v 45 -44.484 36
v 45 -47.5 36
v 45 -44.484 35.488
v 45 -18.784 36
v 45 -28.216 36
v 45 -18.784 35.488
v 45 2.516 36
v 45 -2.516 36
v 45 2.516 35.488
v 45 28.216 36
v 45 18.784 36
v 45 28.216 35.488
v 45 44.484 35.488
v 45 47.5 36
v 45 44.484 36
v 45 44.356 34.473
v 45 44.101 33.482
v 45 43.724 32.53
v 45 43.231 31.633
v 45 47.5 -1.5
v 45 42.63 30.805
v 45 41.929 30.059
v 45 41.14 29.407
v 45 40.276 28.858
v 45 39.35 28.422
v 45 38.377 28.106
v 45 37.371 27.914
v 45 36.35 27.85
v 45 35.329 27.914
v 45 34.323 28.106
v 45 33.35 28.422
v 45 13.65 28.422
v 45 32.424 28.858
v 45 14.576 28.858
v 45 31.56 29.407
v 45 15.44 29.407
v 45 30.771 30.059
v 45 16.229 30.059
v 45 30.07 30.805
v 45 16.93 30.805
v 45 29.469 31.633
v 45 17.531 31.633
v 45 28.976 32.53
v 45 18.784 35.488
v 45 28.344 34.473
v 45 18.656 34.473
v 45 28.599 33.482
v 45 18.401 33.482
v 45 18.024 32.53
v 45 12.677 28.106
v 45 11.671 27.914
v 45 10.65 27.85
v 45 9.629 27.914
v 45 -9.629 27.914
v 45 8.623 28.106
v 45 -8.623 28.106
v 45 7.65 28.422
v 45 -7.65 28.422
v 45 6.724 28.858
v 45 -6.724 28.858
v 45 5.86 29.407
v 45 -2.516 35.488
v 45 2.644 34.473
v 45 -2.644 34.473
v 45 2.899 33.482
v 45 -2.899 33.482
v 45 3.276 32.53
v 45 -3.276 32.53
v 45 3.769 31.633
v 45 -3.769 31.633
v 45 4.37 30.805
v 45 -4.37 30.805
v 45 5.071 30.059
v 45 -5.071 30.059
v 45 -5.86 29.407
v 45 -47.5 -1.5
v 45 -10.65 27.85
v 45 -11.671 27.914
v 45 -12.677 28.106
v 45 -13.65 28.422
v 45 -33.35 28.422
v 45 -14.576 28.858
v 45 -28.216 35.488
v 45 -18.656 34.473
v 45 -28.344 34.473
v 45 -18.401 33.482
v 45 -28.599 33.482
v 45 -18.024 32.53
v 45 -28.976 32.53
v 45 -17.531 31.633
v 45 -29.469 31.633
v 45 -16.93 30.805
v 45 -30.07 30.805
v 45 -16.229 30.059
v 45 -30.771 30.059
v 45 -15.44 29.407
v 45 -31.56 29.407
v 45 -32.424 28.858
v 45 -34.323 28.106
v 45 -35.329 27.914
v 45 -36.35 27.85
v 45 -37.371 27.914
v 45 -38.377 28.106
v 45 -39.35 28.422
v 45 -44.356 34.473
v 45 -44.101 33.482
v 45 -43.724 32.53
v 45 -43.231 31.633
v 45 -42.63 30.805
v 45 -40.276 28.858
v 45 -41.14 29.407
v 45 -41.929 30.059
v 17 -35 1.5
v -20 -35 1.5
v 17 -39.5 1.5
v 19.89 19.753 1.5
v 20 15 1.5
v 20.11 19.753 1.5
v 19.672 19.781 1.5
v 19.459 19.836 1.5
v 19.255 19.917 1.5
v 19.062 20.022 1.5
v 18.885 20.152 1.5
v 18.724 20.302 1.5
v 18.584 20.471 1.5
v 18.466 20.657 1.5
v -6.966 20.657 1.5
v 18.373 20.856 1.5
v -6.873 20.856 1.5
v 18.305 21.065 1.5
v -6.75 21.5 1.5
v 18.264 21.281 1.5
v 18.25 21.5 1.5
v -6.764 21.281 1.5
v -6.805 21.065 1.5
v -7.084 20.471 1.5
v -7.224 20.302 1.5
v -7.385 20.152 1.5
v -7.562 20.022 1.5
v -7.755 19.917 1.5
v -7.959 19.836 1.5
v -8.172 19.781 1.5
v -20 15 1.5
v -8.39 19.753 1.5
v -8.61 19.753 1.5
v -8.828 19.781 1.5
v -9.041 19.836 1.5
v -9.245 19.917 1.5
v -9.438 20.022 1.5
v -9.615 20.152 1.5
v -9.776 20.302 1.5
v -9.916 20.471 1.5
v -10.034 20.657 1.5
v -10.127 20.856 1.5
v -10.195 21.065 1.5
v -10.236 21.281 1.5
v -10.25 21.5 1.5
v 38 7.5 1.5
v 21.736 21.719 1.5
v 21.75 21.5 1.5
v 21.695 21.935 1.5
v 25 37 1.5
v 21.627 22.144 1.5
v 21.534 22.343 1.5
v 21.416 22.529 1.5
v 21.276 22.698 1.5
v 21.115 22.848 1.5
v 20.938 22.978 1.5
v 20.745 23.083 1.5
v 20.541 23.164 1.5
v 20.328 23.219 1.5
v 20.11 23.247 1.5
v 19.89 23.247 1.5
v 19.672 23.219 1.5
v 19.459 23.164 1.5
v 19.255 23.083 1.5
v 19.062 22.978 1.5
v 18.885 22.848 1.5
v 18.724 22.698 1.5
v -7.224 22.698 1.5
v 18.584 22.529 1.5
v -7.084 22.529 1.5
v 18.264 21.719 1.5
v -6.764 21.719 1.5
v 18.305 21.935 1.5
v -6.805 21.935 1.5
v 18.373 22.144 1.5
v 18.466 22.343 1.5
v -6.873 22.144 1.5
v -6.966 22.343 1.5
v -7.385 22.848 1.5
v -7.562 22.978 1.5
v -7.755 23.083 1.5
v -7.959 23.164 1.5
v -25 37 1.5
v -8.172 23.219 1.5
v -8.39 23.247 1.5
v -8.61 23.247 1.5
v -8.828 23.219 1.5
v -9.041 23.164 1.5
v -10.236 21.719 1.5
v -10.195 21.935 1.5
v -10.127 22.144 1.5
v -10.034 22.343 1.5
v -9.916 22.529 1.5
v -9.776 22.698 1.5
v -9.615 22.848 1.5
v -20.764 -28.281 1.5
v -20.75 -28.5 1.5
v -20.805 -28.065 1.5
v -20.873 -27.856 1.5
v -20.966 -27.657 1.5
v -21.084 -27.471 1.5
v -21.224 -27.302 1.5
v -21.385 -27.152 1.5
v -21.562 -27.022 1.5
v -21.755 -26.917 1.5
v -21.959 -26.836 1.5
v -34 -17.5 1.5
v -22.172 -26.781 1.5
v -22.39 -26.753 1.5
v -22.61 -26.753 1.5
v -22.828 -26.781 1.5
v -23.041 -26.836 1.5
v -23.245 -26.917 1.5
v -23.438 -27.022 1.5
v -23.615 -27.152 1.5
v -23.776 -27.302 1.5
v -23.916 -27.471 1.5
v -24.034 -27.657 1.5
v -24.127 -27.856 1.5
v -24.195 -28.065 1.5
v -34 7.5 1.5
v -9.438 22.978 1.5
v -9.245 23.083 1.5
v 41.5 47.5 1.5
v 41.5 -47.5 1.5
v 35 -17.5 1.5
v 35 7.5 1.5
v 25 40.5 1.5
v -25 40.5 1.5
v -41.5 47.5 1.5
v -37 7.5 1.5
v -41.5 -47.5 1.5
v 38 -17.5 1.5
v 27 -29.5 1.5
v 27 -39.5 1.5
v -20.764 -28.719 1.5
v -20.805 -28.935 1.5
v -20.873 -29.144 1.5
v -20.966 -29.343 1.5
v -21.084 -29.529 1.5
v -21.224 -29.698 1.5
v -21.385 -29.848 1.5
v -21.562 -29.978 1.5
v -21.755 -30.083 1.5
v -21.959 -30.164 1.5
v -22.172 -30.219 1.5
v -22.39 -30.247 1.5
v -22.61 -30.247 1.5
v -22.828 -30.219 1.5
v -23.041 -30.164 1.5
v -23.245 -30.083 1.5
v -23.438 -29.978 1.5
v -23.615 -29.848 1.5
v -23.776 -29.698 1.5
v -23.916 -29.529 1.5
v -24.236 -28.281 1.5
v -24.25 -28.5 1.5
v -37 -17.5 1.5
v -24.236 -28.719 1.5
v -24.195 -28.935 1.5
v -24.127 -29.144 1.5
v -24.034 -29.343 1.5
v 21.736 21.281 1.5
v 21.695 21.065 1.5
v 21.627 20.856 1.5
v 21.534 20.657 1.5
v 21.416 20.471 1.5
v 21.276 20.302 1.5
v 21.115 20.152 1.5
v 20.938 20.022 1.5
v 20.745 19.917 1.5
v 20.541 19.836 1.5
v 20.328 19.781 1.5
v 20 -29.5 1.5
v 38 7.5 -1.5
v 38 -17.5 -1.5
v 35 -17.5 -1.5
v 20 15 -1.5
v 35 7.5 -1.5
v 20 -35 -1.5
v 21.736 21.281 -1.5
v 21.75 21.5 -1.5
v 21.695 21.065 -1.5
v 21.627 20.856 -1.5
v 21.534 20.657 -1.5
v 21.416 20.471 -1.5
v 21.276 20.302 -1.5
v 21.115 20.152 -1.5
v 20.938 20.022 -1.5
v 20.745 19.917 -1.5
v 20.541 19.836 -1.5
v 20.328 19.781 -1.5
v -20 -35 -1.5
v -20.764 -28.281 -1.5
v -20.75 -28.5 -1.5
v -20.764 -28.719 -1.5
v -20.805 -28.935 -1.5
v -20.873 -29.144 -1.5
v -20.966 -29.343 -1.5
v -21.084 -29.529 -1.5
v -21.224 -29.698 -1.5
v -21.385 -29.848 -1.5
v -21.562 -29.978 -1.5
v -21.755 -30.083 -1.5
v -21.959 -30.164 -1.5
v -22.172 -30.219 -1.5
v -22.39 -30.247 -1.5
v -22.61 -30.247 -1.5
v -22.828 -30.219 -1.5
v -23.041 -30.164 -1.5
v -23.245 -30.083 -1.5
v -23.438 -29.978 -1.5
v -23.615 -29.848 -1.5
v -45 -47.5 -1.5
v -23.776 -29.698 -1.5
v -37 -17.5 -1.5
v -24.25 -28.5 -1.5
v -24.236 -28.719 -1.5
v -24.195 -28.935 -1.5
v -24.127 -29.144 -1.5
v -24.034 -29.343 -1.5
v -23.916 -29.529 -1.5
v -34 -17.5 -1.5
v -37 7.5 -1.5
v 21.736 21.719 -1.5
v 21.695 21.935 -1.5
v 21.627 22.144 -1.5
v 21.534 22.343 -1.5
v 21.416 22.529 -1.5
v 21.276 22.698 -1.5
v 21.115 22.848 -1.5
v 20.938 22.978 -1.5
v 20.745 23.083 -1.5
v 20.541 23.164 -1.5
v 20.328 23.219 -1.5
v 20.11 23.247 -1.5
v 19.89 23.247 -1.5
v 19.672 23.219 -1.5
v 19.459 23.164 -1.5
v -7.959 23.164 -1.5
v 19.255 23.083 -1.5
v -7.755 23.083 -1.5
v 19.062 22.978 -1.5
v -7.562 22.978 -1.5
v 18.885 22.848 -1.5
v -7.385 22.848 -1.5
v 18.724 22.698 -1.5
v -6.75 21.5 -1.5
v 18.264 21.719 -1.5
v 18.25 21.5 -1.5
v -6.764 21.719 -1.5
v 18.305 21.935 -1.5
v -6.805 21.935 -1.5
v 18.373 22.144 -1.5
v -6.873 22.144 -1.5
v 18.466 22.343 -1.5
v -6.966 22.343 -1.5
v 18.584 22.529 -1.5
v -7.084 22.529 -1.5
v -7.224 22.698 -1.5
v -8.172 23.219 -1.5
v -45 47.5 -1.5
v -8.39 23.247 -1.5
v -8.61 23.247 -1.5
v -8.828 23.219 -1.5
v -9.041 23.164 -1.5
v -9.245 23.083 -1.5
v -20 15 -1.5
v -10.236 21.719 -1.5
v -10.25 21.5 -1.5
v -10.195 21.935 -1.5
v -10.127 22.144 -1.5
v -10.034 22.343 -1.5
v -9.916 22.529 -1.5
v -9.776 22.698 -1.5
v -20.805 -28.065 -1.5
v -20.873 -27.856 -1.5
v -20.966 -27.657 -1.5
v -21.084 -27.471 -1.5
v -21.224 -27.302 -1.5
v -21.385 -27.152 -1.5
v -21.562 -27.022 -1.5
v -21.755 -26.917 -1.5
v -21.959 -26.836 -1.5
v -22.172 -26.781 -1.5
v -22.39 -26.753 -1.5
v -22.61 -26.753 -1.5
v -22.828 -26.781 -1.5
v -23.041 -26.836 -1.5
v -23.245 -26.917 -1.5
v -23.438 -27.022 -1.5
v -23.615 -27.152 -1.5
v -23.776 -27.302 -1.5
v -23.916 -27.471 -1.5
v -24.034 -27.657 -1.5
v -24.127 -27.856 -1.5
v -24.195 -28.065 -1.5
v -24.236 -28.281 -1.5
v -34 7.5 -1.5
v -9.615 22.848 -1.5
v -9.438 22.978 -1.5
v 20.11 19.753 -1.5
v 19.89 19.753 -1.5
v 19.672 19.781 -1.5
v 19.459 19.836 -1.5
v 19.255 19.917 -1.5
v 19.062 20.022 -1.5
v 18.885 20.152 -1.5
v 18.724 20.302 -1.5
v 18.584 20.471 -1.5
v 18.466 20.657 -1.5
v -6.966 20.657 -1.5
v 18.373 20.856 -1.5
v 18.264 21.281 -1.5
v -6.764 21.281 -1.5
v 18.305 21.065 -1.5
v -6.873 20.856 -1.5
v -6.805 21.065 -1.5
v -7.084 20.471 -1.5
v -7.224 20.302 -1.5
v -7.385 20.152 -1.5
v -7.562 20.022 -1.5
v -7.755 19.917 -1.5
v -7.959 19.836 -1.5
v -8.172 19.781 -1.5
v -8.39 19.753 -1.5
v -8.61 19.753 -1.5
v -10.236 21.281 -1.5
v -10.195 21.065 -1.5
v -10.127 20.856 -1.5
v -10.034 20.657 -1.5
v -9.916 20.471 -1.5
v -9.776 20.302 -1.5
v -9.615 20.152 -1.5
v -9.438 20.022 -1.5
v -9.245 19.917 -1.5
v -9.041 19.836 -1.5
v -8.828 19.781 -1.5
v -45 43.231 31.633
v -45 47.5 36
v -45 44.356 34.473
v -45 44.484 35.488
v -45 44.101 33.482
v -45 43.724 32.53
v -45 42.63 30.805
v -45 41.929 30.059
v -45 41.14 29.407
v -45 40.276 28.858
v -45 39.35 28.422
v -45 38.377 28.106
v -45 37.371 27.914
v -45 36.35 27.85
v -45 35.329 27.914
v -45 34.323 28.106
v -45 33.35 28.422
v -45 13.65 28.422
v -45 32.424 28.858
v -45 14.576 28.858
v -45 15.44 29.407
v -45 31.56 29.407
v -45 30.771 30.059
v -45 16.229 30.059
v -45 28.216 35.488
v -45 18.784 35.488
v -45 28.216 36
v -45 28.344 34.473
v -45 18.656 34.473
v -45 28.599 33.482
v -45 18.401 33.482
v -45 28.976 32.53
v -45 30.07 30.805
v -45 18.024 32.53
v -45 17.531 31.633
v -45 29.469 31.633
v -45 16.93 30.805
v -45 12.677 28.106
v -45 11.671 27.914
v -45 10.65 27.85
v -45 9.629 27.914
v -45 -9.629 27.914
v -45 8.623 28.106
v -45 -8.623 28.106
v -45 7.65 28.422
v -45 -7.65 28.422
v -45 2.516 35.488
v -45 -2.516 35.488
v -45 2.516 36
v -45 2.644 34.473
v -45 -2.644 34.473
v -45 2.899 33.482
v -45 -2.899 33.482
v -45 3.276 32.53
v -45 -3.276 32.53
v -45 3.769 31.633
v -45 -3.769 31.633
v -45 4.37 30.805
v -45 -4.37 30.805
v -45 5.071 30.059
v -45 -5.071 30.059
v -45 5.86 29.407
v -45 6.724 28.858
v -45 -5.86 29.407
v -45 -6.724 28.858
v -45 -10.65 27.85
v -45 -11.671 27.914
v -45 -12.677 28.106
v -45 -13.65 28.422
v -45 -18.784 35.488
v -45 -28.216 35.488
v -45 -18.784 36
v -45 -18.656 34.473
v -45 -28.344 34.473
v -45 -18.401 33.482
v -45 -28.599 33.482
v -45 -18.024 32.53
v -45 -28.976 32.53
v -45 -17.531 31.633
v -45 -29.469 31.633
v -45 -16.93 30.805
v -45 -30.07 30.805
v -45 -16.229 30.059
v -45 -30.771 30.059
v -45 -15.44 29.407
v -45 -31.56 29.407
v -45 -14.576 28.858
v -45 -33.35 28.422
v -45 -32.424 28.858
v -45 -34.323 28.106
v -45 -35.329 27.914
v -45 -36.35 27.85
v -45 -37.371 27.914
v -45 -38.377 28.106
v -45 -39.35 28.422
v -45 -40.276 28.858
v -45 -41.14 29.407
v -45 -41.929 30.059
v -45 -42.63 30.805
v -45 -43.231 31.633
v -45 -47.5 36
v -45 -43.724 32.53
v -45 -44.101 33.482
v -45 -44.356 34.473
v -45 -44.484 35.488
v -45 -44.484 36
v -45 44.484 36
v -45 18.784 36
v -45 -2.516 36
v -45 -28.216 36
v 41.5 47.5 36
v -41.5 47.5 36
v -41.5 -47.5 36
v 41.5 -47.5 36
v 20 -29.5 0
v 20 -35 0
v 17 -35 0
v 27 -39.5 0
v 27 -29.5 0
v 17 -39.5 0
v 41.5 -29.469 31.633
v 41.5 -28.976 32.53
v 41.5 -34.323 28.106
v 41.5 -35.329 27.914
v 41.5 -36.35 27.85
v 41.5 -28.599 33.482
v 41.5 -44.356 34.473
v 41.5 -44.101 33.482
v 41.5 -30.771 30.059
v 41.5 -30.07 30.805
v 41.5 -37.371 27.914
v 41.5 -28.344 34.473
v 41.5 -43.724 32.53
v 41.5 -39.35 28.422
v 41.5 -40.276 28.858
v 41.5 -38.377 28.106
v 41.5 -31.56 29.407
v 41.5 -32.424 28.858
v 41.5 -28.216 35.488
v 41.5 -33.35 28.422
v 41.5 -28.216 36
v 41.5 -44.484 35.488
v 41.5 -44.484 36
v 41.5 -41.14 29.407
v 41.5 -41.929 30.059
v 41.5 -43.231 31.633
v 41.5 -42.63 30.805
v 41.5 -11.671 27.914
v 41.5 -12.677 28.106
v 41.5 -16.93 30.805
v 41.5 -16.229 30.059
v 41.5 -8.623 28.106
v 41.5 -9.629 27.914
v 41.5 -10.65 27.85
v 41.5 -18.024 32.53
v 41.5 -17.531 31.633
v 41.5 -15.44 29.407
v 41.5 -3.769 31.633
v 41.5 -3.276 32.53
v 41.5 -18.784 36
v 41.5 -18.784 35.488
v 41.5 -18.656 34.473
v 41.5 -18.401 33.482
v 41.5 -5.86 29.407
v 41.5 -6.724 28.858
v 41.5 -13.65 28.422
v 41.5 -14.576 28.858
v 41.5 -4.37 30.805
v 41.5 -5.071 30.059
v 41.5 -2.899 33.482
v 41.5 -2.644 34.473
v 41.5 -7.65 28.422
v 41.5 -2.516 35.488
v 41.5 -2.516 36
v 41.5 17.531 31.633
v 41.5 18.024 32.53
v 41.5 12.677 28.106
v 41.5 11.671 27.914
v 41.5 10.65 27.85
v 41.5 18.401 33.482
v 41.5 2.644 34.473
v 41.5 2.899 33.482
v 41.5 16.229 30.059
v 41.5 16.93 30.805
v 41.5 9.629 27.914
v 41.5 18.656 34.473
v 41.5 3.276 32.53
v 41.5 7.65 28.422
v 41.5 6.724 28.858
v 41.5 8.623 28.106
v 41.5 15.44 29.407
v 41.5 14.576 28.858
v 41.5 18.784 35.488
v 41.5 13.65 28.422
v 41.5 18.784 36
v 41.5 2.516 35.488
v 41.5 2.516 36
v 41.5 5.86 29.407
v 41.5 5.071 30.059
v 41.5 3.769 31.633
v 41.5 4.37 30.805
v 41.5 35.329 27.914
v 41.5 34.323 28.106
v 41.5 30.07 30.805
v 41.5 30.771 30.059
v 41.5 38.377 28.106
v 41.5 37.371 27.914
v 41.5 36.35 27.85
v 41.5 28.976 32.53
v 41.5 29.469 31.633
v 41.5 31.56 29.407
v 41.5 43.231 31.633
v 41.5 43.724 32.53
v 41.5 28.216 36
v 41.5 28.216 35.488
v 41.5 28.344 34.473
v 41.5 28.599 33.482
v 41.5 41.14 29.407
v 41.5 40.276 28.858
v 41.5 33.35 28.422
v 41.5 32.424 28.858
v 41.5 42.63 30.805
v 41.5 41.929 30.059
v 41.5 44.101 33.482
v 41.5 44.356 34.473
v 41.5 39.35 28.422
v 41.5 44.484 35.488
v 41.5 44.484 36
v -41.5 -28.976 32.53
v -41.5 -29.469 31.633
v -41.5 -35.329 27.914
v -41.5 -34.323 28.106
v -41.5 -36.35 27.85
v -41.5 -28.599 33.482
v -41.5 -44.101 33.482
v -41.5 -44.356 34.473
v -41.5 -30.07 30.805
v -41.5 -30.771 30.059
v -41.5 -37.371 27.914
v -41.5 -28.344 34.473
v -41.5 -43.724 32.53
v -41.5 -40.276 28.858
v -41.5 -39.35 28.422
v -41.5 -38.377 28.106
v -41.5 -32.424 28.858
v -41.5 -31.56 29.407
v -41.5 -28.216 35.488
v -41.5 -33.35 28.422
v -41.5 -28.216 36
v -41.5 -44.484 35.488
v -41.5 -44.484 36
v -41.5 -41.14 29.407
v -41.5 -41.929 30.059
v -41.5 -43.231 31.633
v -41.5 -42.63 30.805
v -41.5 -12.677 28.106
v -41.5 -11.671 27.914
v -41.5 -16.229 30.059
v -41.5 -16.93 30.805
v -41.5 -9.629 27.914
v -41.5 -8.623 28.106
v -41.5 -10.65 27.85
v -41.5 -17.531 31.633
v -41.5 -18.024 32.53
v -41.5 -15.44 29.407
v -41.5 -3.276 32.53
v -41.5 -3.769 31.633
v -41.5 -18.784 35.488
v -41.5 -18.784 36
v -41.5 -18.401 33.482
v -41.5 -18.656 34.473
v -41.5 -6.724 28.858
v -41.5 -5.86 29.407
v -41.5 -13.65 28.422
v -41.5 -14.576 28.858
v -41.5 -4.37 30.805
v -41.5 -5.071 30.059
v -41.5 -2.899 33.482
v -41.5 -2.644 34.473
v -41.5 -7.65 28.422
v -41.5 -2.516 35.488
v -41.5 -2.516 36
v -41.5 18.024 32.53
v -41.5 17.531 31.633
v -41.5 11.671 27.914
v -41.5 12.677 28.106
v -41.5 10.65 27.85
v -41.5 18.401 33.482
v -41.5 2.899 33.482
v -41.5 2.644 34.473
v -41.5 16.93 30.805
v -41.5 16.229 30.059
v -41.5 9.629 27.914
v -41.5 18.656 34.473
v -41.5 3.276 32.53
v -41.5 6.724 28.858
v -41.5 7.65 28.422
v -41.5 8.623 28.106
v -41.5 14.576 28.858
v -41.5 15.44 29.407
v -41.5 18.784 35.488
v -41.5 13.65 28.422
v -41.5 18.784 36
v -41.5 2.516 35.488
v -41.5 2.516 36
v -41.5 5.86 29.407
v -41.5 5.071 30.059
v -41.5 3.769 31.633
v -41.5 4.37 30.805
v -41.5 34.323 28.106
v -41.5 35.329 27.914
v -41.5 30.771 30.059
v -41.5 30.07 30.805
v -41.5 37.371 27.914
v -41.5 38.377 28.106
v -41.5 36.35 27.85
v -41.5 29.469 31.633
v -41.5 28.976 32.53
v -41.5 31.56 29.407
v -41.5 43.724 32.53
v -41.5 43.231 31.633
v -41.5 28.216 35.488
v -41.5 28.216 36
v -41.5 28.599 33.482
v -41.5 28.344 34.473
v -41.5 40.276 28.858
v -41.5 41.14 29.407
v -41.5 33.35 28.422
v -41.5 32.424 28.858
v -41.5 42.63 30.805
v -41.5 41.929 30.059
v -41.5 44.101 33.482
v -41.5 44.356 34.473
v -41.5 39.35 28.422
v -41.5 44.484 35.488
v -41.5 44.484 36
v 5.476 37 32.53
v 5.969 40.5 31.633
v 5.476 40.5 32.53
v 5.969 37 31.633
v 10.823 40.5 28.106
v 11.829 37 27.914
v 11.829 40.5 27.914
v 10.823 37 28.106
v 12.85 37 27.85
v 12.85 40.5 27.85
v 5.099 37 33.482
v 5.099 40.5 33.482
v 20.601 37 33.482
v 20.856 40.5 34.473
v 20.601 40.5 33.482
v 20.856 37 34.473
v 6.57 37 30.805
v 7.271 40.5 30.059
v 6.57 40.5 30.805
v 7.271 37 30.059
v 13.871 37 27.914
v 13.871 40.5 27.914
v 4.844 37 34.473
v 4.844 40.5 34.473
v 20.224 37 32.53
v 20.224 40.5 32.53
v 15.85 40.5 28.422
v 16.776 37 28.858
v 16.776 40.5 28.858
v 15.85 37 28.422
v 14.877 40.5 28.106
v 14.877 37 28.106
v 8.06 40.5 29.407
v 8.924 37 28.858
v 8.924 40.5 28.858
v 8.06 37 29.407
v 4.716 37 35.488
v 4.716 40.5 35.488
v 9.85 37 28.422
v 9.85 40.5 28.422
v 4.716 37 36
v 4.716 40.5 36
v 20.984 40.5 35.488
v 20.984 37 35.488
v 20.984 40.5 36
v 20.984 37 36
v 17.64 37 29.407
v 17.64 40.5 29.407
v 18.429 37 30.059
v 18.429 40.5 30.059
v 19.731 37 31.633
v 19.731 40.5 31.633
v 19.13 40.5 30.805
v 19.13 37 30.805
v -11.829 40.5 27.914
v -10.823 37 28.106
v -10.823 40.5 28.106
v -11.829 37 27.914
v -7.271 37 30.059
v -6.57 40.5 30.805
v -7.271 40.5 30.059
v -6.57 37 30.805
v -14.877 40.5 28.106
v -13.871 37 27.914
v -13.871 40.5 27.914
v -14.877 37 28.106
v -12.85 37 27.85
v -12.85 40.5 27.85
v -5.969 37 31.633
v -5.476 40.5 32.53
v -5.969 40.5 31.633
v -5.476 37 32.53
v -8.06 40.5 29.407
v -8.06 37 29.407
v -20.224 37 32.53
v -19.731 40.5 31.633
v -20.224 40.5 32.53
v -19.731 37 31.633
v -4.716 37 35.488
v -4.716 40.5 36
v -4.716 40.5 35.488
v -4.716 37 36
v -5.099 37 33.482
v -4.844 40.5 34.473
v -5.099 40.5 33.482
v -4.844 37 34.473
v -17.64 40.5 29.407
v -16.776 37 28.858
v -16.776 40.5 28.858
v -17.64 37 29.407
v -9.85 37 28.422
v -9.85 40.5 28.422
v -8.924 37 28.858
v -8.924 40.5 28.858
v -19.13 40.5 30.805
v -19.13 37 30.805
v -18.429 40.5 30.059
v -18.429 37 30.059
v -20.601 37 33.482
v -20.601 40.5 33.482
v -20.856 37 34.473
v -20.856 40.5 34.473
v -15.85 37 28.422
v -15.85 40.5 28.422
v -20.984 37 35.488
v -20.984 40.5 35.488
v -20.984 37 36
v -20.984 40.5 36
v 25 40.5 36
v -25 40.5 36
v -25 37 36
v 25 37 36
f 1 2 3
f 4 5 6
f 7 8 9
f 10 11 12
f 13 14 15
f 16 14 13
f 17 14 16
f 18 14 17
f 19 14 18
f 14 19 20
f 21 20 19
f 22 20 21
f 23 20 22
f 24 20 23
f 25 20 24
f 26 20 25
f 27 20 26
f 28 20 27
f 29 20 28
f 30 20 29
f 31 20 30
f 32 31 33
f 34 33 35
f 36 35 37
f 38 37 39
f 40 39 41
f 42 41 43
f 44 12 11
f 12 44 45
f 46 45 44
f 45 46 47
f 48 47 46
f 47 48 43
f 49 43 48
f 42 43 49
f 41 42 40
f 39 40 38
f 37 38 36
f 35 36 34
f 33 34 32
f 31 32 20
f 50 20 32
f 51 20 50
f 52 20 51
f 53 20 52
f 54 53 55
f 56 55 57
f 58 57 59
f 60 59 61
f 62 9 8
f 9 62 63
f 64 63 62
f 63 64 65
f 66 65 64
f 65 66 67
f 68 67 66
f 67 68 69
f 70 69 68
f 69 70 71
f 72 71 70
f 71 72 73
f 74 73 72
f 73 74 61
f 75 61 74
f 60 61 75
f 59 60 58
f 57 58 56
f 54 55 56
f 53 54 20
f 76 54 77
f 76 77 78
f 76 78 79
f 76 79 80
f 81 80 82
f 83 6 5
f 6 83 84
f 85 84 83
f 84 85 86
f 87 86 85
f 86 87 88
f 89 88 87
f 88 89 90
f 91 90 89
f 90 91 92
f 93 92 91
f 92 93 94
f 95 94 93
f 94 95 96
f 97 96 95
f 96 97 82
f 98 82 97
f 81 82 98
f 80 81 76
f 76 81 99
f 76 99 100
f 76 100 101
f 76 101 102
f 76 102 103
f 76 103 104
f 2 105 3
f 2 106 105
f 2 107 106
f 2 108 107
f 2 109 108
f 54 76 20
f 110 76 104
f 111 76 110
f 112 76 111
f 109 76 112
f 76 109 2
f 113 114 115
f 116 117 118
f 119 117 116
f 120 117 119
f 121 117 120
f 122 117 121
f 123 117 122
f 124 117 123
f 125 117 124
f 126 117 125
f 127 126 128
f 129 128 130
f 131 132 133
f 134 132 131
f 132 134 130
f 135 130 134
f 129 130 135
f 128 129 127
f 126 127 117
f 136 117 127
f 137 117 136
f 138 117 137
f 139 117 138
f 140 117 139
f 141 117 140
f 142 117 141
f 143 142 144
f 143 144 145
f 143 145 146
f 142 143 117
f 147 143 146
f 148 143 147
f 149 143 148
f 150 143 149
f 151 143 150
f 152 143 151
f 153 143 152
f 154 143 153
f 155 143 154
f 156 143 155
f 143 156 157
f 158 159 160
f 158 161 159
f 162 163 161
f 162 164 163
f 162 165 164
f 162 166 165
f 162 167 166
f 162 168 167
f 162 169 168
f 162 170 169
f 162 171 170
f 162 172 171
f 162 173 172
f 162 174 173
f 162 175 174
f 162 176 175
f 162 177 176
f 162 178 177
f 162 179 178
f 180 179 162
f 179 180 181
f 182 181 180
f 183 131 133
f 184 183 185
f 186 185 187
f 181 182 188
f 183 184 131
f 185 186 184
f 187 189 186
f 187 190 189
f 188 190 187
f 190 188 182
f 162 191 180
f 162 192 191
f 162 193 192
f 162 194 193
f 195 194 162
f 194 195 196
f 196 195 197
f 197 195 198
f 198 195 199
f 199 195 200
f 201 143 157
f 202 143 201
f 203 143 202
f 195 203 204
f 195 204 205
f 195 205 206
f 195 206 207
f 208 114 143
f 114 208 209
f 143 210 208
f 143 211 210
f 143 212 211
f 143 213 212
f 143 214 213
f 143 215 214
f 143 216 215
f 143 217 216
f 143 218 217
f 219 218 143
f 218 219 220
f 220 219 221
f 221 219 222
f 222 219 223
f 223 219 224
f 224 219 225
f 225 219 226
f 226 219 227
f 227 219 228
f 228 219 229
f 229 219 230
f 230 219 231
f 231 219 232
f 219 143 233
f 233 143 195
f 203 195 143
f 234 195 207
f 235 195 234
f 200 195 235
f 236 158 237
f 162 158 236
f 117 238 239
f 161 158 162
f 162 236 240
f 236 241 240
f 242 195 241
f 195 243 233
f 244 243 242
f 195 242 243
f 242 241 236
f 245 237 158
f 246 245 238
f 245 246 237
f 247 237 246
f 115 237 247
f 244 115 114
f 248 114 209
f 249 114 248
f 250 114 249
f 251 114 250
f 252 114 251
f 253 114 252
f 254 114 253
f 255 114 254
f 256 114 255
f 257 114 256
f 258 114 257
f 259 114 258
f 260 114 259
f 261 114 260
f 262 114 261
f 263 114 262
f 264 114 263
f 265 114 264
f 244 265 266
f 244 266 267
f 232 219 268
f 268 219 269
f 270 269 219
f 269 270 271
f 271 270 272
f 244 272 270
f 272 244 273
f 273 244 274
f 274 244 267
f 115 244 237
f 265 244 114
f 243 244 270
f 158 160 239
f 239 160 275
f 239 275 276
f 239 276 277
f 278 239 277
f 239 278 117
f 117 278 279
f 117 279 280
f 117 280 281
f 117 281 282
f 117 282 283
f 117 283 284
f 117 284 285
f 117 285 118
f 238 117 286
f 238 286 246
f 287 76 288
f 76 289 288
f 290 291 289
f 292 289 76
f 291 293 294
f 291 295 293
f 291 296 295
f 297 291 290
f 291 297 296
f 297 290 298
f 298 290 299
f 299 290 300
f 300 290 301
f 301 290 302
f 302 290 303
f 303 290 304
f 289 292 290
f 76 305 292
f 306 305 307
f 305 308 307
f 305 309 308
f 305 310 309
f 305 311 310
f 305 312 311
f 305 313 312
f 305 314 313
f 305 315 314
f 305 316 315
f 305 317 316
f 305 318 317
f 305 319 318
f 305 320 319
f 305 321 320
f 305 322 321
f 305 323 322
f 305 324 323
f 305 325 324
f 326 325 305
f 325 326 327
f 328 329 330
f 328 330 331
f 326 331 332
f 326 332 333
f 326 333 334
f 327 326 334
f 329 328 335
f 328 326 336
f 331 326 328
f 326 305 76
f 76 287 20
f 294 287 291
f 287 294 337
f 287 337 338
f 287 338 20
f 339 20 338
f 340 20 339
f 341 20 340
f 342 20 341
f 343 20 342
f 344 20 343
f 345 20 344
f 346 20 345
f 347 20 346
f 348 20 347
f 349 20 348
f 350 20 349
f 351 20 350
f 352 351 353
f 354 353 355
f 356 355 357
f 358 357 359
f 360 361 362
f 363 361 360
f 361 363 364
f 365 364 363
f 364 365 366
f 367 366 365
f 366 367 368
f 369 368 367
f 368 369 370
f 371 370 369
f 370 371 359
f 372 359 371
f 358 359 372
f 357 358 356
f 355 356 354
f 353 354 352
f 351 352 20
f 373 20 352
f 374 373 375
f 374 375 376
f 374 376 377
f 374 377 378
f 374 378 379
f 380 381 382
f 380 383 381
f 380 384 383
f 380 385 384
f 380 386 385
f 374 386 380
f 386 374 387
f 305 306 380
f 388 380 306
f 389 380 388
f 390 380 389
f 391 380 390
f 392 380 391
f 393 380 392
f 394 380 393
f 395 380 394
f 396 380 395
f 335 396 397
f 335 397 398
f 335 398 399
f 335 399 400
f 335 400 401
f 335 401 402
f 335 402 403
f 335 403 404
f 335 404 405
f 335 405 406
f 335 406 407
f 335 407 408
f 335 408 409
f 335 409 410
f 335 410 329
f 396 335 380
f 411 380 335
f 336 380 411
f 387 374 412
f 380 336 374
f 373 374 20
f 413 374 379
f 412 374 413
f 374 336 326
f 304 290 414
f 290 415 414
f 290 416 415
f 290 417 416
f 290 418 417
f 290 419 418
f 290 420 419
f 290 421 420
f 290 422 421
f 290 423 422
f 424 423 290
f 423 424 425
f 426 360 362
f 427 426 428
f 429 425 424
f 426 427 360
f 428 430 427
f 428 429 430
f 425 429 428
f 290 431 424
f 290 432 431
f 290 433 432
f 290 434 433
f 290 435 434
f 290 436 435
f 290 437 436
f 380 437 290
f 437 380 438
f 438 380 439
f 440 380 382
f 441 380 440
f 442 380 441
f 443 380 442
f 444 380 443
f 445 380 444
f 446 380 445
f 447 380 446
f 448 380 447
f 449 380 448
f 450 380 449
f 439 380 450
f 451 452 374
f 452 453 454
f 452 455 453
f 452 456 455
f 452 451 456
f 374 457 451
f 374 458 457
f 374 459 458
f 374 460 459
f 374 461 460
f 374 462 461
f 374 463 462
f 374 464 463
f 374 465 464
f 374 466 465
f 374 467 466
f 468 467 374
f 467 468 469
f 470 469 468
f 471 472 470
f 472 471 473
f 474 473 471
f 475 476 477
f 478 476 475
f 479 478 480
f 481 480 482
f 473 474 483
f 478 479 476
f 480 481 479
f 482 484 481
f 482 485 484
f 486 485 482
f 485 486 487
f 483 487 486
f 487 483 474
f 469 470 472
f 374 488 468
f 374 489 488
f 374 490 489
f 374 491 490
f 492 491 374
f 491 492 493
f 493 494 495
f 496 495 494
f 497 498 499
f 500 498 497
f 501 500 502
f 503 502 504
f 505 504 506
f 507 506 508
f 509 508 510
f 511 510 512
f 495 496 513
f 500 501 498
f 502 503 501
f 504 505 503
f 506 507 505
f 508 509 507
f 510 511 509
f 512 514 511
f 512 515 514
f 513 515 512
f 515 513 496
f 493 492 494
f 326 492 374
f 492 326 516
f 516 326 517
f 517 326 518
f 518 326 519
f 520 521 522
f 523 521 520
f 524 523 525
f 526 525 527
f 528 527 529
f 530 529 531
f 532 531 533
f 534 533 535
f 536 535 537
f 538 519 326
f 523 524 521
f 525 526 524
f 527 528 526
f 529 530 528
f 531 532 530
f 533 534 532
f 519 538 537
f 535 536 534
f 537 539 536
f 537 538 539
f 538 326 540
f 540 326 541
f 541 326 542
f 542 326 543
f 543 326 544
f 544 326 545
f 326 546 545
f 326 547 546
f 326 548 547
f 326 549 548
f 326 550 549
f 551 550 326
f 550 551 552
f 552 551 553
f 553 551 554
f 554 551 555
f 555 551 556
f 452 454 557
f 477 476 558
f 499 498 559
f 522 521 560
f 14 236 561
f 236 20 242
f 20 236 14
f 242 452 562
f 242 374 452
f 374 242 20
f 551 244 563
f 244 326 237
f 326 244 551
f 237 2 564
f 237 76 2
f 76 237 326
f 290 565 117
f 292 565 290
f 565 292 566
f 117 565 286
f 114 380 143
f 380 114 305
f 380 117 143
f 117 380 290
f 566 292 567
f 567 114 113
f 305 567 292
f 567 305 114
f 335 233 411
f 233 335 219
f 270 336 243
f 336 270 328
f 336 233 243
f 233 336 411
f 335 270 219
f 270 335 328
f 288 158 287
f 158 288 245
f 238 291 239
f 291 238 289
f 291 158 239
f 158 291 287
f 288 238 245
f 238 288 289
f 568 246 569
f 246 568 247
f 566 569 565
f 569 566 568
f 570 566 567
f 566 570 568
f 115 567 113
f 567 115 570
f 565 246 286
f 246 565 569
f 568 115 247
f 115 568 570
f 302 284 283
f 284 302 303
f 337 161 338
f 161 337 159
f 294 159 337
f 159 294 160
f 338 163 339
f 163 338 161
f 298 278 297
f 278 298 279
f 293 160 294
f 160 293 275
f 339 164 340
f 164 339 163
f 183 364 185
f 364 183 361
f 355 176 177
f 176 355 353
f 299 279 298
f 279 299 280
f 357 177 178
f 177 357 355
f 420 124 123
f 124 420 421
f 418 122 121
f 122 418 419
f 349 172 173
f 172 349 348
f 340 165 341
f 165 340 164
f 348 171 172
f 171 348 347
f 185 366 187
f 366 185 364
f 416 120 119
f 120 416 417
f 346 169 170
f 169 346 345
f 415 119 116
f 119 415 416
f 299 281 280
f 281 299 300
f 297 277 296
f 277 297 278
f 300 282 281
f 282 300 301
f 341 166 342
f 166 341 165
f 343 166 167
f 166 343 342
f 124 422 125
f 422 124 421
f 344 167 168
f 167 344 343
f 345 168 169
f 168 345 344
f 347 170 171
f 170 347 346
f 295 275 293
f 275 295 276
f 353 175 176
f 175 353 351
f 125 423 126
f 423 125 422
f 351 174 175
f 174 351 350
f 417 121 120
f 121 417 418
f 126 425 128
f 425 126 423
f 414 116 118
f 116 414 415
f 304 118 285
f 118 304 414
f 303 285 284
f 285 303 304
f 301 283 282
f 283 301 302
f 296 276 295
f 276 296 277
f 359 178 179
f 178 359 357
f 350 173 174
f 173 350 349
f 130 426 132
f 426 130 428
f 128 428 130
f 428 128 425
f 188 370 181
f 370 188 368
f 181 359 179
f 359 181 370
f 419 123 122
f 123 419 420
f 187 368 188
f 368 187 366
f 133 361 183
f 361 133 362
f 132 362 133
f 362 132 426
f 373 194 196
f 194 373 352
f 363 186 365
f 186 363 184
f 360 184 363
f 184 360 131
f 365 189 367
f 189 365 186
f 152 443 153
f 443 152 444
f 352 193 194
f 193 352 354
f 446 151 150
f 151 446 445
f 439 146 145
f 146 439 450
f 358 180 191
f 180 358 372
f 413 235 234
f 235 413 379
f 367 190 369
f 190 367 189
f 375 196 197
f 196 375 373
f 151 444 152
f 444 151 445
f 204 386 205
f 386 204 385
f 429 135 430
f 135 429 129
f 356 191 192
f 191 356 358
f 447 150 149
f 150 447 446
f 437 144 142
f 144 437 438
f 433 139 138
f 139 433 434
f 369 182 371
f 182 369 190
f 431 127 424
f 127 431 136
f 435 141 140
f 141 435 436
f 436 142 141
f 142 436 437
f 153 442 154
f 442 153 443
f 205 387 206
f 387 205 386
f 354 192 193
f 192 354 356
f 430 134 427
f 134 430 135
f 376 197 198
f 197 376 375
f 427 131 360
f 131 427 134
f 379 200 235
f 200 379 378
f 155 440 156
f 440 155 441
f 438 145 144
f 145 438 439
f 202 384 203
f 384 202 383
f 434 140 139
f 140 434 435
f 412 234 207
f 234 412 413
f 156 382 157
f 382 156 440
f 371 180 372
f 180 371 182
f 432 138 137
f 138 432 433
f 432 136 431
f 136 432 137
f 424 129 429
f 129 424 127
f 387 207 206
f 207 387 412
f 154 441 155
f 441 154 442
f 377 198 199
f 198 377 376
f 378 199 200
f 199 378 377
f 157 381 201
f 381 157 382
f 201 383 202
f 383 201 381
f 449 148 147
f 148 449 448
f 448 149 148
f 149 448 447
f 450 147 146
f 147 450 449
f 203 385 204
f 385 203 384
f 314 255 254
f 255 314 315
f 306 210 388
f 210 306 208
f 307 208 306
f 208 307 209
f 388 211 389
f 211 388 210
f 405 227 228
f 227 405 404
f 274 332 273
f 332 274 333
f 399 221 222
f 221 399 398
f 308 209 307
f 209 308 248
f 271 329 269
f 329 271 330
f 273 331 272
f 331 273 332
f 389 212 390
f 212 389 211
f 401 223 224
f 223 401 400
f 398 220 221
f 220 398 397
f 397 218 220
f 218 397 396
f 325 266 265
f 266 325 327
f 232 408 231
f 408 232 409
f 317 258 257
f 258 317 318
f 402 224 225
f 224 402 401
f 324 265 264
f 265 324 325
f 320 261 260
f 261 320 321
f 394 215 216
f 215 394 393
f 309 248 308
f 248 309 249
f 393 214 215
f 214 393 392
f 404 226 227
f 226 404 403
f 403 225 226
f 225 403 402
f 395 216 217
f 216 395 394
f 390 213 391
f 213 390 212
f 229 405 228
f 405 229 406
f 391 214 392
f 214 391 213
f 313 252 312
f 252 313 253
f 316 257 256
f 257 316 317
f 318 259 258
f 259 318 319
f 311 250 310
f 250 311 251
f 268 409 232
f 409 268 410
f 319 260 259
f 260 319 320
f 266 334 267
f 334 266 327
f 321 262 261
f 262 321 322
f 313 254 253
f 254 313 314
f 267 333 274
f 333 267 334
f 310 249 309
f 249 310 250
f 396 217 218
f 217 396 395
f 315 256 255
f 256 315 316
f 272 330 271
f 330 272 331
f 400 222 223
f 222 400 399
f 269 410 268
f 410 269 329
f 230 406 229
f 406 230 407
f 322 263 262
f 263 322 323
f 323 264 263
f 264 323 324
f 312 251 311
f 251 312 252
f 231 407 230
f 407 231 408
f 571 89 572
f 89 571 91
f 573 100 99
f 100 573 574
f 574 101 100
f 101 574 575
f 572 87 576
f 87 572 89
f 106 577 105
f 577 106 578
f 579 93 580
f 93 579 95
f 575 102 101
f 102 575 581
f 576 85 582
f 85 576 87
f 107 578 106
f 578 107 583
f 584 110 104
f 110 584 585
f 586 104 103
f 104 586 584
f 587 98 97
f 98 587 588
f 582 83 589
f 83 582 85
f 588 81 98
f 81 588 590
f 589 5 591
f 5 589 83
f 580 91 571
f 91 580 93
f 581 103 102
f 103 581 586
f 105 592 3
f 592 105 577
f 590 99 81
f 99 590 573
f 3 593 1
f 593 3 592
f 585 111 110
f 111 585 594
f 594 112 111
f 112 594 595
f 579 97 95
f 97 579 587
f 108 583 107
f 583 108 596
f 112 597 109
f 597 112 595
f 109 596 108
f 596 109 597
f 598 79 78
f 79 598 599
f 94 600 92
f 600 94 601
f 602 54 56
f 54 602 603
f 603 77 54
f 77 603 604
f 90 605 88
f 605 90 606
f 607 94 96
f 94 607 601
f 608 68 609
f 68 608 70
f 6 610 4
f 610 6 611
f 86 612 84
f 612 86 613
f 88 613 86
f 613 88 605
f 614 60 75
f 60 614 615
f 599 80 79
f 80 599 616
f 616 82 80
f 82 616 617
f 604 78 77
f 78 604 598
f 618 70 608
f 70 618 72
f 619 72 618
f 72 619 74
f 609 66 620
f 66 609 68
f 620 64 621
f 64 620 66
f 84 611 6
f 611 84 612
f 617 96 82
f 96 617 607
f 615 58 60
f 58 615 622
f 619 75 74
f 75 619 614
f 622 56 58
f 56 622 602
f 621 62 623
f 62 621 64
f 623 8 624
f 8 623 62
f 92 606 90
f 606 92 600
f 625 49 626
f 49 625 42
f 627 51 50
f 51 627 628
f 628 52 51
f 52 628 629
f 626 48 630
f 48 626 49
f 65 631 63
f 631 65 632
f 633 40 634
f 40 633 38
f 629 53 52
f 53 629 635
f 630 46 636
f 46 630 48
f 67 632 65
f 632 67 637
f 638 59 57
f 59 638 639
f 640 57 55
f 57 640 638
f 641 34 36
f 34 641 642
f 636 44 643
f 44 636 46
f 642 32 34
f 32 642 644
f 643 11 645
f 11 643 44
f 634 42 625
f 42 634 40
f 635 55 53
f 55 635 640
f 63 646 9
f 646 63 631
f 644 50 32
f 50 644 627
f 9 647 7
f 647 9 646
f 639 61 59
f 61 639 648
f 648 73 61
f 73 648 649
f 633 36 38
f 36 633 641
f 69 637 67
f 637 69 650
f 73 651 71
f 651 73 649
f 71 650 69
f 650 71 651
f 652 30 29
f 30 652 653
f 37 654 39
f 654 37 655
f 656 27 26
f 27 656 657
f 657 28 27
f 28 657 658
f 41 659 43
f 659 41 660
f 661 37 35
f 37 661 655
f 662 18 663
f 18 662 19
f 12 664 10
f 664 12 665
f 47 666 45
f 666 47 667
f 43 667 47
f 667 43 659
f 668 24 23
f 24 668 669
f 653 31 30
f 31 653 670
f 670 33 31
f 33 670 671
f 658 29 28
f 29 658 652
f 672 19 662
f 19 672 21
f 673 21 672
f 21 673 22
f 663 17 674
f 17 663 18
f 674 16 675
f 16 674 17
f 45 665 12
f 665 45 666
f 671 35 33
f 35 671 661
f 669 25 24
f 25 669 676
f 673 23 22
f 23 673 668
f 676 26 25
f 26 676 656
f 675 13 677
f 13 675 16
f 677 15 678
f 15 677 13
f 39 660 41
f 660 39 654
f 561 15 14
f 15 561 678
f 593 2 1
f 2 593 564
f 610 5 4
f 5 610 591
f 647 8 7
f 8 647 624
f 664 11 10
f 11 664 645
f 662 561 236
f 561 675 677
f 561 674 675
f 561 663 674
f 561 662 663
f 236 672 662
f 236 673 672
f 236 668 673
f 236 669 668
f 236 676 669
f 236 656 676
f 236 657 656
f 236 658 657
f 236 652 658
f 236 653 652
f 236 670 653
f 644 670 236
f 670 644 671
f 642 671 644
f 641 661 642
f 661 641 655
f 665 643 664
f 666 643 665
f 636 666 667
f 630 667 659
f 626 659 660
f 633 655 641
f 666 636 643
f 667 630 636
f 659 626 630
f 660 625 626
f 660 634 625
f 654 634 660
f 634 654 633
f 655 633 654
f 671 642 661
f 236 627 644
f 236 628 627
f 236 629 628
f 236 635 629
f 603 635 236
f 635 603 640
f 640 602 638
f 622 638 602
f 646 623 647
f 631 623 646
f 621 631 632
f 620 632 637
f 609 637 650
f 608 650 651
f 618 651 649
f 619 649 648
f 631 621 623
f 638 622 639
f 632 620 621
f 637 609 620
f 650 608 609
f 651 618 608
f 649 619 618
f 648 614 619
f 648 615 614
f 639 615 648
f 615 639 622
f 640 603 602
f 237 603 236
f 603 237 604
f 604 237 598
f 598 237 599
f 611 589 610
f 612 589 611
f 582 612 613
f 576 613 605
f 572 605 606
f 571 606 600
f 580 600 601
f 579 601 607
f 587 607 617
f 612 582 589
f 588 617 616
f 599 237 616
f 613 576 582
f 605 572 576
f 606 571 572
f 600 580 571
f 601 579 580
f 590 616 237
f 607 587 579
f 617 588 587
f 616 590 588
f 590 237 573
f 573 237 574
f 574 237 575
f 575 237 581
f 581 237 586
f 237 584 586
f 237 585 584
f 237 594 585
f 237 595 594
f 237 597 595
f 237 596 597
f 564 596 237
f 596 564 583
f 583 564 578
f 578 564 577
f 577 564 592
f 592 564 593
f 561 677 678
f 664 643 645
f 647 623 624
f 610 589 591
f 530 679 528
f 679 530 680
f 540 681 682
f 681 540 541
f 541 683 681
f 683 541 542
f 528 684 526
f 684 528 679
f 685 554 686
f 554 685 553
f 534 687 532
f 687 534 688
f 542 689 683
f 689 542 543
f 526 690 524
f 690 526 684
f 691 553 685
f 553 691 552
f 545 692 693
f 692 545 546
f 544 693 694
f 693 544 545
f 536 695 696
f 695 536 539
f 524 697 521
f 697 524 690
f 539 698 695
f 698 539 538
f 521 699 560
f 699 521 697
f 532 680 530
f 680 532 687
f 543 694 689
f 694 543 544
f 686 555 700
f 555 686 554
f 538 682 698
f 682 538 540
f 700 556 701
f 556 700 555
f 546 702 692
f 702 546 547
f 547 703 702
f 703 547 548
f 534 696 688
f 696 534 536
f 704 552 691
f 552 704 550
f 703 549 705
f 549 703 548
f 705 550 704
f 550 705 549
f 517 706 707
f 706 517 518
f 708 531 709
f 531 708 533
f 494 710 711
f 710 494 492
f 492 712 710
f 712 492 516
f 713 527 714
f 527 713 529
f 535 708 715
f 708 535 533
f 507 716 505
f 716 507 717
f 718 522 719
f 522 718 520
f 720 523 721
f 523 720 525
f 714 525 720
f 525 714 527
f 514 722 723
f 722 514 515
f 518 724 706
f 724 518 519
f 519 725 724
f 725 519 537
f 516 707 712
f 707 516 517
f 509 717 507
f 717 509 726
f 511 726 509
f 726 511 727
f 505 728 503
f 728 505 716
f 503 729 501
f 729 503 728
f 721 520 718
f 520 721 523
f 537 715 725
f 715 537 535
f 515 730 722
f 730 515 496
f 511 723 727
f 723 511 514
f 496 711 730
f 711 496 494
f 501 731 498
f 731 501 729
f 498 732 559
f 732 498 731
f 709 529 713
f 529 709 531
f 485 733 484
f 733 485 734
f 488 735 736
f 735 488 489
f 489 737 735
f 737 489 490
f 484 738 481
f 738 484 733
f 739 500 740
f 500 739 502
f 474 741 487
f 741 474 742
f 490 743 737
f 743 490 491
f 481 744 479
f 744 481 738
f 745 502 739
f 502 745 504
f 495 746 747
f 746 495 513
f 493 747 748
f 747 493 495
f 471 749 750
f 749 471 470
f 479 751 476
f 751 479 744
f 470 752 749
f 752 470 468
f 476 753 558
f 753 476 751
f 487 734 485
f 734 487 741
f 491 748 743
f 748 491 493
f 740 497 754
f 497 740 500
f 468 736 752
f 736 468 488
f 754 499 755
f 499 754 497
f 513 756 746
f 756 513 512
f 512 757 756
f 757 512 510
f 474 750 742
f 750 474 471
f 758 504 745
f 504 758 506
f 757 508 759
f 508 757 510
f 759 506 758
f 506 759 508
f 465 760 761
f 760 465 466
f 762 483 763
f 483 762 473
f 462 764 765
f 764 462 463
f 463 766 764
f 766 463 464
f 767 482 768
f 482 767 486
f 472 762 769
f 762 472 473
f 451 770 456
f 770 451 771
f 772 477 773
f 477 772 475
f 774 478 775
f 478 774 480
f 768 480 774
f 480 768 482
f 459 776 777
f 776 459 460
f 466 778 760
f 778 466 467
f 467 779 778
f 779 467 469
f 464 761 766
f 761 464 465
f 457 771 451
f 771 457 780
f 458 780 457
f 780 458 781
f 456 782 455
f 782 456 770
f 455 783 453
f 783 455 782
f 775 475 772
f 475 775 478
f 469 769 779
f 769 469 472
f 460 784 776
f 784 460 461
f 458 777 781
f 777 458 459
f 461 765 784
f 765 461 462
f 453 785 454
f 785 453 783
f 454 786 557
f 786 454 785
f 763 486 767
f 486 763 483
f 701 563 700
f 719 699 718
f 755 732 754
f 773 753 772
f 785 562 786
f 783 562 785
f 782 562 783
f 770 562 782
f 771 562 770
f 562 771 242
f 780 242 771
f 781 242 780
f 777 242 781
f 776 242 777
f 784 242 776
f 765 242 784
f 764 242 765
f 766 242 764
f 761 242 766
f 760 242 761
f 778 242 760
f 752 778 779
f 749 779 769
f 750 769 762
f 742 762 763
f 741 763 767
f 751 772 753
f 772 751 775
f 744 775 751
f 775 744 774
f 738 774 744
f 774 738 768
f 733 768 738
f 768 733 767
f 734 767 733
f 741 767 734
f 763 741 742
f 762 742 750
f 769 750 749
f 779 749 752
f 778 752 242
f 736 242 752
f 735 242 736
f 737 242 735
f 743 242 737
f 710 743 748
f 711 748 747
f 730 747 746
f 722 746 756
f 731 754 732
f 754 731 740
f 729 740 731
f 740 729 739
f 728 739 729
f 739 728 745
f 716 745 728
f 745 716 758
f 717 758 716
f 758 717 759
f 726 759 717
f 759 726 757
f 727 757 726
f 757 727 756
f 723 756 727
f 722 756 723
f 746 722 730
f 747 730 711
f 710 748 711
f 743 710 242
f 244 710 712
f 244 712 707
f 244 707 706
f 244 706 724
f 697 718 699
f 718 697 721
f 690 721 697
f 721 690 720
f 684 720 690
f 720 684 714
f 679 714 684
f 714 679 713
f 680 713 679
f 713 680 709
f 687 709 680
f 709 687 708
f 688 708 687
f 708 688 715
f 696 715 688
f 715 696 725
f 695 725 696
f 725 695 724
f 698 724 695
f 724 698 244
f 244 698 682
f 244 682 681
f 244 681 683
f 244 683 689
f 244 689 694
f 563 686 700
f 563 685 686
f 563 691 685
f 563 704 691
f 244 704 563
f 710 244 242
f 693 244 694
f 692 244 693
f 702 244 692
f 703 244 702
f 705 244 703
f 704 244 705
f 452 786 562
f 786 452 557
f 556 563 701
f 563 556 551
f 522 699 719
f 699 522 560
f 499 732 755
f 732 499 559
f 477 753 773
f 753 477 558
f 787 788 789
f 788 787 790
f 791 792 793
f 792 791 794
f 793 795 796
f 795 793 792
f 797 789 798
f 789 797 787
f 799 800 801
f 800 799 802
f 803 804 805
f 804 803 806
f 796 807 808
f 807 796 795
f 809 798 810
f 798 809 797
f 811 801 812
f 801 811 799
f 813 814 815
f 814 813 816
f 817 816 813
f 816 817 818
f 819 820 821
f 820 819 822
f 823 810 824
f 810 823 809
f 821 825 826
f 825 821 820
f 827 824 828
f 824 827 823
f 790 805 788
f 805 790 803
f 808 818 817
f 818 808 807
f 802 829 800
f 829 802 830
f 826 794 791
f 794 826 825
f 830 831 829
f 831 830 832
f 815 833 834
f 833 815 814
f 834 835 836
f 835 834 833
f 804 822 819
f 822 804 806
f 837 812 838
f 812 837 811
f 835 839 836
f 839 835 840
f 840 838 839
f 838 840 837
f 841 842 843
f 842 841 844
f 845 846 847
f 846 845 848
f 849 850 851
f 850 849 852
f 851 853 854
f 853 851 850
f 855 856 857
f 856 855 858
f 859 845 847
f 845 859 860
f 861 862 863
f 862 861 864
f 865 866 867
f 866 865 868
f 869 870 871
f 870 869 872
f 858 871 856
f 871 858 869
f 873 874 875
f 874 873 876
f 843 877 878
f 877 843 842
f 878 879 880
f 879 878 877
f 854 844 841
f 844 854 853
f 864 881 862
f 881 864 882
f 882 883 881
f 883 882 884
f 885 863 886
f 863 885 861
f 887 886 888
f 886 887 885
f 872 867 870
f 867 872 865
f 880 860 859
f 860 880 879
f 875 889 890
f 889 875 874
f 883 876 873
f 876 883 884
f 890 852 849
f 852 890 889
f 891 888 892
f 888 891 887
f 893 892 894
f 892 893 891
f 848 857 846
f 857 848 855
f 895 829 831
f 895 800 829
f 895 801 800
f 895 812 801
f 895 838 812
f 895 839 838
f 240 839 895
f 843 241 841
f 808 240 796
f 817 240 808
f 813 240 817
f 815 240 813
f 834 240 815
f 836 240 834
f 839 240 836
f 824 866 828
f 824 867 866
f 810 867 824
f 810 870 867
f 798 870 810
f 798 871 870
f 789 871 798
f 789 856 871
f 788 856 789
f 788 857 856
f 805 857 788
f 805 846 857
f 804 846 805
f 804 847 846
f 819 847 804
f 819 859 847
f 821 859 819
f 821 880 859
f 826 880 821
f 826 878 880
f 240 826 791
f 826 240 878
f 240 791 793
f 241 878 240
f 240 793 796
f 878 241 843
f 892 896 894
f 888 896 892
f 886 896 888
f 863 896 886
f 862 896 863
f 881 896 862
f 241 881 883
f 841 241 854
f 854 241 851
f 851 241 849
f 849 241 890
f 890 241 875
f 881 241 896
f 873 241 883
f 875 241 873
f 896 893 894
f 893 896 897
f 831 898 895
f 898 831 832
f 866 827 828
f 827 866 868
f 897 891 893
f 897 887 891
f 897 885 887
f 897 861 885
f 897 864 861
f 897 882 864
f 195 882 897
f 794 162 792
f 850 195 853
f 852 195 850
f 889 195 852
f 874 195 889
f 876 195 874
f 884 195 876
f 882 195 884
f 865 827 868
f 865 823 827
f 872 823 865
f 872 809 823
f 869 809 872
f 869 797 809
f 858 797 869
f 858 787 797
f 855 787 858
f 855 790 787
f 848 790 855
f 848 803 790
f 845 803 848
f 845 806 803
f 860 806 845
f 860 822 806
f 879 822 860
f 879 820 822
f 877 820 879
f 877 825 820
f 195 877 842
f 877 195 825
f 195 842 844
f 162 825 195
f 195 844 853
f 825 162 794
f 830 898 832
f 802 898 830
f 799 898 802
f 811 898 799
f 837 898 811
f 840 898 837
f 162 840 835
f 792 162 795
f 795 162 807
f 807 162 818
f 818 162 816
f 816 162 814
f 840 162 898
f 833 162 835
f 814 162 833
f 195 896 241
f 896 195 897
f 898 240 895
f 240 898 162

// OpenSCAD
// Dreamster parametric prototype chassis V2


// Default resolution (set it lower for faster rendering)
$fn = 50;


// Chassis parameters
depth = 95;
width = 90;
height_wall = 25+8+1.5;
thickness = 3;
thickness_wall = 3.5;
mount_holes_diameter = 3;
hole_width = 40;
hole_depth = 50;
hole_pos_y = 10;

module distance_sensor() {
  radio = 16.3 / 2;
  sep = 25.7;
  translate([-10, -(radio)-(sep-2*radio)/2, 0]) {
	rotate ([0, 90, 0]) {
		cylinder (h = 20, r = radio);
		translate ([0, sep, 0]) {
			cylinder (h = 20, r = radio);
		}
	}
}
}

module base() {
  difference() {
    cube([width, depth, thickness], center=true);
    translate([0, -hole_pos_y, 0]) {
      cube([hole_width, hole_depth, thickness+1], center=true);
    }
	translate([-37, -depth/2 + 30, -3]) {
		cube([3, 25, 6], center=false);
	}
	translate([35, -depth/2 + 30, -3]) {
		cube([3, 25, 6], center=false);
	}
	translate([17, -depth/2 + 8, 0]) {
		cube([10, 10, 3], center=false);
	}

	translate ([20, -depth/2 + 69, -5]) {
		cylinder (h = 20, r = 1.75);
	}

	translate ([-8.5, -depth/2 + 69, -5]) {
		cylinder (h = 20, r = 1.75);
	}

	translate ([-22.5, -depth/2 + 19, -5]) {
		cylinder (h = 20, r = 1.75);
	}
  }
}


module side_wall() {
  difference() {
    cube([thickness_wall, depth, height_wall], center=true);
    translate([0, -43/2-2, height_wall/2]) {
      distance_sensor();
    }
    translate([0, 43/2+2, height_wall/2]) {
      distance_sensor();
    }
  }
}

module front_wall() {
  difference() {
    cube([thickness_wall, 50, height_wall], center=true);
    translate([0,0,height_wall/2]) {
      distance_sensor();
    }
  }
}


base();
translate([width/2-thickness_wall/2, 0, height_wall/2+thickness/2]) {
  side_wall();
}
translate([-(width/2-thickness_wall/2), 0, height_wall/2+thickness/2]) {
  side_wall();
}
translate([0, depth/2-thickness_wall/2-7, height_wall/2+thickness/2]) {
  rotate([0, 0, 90]) {
    front_wall();
  }
}
